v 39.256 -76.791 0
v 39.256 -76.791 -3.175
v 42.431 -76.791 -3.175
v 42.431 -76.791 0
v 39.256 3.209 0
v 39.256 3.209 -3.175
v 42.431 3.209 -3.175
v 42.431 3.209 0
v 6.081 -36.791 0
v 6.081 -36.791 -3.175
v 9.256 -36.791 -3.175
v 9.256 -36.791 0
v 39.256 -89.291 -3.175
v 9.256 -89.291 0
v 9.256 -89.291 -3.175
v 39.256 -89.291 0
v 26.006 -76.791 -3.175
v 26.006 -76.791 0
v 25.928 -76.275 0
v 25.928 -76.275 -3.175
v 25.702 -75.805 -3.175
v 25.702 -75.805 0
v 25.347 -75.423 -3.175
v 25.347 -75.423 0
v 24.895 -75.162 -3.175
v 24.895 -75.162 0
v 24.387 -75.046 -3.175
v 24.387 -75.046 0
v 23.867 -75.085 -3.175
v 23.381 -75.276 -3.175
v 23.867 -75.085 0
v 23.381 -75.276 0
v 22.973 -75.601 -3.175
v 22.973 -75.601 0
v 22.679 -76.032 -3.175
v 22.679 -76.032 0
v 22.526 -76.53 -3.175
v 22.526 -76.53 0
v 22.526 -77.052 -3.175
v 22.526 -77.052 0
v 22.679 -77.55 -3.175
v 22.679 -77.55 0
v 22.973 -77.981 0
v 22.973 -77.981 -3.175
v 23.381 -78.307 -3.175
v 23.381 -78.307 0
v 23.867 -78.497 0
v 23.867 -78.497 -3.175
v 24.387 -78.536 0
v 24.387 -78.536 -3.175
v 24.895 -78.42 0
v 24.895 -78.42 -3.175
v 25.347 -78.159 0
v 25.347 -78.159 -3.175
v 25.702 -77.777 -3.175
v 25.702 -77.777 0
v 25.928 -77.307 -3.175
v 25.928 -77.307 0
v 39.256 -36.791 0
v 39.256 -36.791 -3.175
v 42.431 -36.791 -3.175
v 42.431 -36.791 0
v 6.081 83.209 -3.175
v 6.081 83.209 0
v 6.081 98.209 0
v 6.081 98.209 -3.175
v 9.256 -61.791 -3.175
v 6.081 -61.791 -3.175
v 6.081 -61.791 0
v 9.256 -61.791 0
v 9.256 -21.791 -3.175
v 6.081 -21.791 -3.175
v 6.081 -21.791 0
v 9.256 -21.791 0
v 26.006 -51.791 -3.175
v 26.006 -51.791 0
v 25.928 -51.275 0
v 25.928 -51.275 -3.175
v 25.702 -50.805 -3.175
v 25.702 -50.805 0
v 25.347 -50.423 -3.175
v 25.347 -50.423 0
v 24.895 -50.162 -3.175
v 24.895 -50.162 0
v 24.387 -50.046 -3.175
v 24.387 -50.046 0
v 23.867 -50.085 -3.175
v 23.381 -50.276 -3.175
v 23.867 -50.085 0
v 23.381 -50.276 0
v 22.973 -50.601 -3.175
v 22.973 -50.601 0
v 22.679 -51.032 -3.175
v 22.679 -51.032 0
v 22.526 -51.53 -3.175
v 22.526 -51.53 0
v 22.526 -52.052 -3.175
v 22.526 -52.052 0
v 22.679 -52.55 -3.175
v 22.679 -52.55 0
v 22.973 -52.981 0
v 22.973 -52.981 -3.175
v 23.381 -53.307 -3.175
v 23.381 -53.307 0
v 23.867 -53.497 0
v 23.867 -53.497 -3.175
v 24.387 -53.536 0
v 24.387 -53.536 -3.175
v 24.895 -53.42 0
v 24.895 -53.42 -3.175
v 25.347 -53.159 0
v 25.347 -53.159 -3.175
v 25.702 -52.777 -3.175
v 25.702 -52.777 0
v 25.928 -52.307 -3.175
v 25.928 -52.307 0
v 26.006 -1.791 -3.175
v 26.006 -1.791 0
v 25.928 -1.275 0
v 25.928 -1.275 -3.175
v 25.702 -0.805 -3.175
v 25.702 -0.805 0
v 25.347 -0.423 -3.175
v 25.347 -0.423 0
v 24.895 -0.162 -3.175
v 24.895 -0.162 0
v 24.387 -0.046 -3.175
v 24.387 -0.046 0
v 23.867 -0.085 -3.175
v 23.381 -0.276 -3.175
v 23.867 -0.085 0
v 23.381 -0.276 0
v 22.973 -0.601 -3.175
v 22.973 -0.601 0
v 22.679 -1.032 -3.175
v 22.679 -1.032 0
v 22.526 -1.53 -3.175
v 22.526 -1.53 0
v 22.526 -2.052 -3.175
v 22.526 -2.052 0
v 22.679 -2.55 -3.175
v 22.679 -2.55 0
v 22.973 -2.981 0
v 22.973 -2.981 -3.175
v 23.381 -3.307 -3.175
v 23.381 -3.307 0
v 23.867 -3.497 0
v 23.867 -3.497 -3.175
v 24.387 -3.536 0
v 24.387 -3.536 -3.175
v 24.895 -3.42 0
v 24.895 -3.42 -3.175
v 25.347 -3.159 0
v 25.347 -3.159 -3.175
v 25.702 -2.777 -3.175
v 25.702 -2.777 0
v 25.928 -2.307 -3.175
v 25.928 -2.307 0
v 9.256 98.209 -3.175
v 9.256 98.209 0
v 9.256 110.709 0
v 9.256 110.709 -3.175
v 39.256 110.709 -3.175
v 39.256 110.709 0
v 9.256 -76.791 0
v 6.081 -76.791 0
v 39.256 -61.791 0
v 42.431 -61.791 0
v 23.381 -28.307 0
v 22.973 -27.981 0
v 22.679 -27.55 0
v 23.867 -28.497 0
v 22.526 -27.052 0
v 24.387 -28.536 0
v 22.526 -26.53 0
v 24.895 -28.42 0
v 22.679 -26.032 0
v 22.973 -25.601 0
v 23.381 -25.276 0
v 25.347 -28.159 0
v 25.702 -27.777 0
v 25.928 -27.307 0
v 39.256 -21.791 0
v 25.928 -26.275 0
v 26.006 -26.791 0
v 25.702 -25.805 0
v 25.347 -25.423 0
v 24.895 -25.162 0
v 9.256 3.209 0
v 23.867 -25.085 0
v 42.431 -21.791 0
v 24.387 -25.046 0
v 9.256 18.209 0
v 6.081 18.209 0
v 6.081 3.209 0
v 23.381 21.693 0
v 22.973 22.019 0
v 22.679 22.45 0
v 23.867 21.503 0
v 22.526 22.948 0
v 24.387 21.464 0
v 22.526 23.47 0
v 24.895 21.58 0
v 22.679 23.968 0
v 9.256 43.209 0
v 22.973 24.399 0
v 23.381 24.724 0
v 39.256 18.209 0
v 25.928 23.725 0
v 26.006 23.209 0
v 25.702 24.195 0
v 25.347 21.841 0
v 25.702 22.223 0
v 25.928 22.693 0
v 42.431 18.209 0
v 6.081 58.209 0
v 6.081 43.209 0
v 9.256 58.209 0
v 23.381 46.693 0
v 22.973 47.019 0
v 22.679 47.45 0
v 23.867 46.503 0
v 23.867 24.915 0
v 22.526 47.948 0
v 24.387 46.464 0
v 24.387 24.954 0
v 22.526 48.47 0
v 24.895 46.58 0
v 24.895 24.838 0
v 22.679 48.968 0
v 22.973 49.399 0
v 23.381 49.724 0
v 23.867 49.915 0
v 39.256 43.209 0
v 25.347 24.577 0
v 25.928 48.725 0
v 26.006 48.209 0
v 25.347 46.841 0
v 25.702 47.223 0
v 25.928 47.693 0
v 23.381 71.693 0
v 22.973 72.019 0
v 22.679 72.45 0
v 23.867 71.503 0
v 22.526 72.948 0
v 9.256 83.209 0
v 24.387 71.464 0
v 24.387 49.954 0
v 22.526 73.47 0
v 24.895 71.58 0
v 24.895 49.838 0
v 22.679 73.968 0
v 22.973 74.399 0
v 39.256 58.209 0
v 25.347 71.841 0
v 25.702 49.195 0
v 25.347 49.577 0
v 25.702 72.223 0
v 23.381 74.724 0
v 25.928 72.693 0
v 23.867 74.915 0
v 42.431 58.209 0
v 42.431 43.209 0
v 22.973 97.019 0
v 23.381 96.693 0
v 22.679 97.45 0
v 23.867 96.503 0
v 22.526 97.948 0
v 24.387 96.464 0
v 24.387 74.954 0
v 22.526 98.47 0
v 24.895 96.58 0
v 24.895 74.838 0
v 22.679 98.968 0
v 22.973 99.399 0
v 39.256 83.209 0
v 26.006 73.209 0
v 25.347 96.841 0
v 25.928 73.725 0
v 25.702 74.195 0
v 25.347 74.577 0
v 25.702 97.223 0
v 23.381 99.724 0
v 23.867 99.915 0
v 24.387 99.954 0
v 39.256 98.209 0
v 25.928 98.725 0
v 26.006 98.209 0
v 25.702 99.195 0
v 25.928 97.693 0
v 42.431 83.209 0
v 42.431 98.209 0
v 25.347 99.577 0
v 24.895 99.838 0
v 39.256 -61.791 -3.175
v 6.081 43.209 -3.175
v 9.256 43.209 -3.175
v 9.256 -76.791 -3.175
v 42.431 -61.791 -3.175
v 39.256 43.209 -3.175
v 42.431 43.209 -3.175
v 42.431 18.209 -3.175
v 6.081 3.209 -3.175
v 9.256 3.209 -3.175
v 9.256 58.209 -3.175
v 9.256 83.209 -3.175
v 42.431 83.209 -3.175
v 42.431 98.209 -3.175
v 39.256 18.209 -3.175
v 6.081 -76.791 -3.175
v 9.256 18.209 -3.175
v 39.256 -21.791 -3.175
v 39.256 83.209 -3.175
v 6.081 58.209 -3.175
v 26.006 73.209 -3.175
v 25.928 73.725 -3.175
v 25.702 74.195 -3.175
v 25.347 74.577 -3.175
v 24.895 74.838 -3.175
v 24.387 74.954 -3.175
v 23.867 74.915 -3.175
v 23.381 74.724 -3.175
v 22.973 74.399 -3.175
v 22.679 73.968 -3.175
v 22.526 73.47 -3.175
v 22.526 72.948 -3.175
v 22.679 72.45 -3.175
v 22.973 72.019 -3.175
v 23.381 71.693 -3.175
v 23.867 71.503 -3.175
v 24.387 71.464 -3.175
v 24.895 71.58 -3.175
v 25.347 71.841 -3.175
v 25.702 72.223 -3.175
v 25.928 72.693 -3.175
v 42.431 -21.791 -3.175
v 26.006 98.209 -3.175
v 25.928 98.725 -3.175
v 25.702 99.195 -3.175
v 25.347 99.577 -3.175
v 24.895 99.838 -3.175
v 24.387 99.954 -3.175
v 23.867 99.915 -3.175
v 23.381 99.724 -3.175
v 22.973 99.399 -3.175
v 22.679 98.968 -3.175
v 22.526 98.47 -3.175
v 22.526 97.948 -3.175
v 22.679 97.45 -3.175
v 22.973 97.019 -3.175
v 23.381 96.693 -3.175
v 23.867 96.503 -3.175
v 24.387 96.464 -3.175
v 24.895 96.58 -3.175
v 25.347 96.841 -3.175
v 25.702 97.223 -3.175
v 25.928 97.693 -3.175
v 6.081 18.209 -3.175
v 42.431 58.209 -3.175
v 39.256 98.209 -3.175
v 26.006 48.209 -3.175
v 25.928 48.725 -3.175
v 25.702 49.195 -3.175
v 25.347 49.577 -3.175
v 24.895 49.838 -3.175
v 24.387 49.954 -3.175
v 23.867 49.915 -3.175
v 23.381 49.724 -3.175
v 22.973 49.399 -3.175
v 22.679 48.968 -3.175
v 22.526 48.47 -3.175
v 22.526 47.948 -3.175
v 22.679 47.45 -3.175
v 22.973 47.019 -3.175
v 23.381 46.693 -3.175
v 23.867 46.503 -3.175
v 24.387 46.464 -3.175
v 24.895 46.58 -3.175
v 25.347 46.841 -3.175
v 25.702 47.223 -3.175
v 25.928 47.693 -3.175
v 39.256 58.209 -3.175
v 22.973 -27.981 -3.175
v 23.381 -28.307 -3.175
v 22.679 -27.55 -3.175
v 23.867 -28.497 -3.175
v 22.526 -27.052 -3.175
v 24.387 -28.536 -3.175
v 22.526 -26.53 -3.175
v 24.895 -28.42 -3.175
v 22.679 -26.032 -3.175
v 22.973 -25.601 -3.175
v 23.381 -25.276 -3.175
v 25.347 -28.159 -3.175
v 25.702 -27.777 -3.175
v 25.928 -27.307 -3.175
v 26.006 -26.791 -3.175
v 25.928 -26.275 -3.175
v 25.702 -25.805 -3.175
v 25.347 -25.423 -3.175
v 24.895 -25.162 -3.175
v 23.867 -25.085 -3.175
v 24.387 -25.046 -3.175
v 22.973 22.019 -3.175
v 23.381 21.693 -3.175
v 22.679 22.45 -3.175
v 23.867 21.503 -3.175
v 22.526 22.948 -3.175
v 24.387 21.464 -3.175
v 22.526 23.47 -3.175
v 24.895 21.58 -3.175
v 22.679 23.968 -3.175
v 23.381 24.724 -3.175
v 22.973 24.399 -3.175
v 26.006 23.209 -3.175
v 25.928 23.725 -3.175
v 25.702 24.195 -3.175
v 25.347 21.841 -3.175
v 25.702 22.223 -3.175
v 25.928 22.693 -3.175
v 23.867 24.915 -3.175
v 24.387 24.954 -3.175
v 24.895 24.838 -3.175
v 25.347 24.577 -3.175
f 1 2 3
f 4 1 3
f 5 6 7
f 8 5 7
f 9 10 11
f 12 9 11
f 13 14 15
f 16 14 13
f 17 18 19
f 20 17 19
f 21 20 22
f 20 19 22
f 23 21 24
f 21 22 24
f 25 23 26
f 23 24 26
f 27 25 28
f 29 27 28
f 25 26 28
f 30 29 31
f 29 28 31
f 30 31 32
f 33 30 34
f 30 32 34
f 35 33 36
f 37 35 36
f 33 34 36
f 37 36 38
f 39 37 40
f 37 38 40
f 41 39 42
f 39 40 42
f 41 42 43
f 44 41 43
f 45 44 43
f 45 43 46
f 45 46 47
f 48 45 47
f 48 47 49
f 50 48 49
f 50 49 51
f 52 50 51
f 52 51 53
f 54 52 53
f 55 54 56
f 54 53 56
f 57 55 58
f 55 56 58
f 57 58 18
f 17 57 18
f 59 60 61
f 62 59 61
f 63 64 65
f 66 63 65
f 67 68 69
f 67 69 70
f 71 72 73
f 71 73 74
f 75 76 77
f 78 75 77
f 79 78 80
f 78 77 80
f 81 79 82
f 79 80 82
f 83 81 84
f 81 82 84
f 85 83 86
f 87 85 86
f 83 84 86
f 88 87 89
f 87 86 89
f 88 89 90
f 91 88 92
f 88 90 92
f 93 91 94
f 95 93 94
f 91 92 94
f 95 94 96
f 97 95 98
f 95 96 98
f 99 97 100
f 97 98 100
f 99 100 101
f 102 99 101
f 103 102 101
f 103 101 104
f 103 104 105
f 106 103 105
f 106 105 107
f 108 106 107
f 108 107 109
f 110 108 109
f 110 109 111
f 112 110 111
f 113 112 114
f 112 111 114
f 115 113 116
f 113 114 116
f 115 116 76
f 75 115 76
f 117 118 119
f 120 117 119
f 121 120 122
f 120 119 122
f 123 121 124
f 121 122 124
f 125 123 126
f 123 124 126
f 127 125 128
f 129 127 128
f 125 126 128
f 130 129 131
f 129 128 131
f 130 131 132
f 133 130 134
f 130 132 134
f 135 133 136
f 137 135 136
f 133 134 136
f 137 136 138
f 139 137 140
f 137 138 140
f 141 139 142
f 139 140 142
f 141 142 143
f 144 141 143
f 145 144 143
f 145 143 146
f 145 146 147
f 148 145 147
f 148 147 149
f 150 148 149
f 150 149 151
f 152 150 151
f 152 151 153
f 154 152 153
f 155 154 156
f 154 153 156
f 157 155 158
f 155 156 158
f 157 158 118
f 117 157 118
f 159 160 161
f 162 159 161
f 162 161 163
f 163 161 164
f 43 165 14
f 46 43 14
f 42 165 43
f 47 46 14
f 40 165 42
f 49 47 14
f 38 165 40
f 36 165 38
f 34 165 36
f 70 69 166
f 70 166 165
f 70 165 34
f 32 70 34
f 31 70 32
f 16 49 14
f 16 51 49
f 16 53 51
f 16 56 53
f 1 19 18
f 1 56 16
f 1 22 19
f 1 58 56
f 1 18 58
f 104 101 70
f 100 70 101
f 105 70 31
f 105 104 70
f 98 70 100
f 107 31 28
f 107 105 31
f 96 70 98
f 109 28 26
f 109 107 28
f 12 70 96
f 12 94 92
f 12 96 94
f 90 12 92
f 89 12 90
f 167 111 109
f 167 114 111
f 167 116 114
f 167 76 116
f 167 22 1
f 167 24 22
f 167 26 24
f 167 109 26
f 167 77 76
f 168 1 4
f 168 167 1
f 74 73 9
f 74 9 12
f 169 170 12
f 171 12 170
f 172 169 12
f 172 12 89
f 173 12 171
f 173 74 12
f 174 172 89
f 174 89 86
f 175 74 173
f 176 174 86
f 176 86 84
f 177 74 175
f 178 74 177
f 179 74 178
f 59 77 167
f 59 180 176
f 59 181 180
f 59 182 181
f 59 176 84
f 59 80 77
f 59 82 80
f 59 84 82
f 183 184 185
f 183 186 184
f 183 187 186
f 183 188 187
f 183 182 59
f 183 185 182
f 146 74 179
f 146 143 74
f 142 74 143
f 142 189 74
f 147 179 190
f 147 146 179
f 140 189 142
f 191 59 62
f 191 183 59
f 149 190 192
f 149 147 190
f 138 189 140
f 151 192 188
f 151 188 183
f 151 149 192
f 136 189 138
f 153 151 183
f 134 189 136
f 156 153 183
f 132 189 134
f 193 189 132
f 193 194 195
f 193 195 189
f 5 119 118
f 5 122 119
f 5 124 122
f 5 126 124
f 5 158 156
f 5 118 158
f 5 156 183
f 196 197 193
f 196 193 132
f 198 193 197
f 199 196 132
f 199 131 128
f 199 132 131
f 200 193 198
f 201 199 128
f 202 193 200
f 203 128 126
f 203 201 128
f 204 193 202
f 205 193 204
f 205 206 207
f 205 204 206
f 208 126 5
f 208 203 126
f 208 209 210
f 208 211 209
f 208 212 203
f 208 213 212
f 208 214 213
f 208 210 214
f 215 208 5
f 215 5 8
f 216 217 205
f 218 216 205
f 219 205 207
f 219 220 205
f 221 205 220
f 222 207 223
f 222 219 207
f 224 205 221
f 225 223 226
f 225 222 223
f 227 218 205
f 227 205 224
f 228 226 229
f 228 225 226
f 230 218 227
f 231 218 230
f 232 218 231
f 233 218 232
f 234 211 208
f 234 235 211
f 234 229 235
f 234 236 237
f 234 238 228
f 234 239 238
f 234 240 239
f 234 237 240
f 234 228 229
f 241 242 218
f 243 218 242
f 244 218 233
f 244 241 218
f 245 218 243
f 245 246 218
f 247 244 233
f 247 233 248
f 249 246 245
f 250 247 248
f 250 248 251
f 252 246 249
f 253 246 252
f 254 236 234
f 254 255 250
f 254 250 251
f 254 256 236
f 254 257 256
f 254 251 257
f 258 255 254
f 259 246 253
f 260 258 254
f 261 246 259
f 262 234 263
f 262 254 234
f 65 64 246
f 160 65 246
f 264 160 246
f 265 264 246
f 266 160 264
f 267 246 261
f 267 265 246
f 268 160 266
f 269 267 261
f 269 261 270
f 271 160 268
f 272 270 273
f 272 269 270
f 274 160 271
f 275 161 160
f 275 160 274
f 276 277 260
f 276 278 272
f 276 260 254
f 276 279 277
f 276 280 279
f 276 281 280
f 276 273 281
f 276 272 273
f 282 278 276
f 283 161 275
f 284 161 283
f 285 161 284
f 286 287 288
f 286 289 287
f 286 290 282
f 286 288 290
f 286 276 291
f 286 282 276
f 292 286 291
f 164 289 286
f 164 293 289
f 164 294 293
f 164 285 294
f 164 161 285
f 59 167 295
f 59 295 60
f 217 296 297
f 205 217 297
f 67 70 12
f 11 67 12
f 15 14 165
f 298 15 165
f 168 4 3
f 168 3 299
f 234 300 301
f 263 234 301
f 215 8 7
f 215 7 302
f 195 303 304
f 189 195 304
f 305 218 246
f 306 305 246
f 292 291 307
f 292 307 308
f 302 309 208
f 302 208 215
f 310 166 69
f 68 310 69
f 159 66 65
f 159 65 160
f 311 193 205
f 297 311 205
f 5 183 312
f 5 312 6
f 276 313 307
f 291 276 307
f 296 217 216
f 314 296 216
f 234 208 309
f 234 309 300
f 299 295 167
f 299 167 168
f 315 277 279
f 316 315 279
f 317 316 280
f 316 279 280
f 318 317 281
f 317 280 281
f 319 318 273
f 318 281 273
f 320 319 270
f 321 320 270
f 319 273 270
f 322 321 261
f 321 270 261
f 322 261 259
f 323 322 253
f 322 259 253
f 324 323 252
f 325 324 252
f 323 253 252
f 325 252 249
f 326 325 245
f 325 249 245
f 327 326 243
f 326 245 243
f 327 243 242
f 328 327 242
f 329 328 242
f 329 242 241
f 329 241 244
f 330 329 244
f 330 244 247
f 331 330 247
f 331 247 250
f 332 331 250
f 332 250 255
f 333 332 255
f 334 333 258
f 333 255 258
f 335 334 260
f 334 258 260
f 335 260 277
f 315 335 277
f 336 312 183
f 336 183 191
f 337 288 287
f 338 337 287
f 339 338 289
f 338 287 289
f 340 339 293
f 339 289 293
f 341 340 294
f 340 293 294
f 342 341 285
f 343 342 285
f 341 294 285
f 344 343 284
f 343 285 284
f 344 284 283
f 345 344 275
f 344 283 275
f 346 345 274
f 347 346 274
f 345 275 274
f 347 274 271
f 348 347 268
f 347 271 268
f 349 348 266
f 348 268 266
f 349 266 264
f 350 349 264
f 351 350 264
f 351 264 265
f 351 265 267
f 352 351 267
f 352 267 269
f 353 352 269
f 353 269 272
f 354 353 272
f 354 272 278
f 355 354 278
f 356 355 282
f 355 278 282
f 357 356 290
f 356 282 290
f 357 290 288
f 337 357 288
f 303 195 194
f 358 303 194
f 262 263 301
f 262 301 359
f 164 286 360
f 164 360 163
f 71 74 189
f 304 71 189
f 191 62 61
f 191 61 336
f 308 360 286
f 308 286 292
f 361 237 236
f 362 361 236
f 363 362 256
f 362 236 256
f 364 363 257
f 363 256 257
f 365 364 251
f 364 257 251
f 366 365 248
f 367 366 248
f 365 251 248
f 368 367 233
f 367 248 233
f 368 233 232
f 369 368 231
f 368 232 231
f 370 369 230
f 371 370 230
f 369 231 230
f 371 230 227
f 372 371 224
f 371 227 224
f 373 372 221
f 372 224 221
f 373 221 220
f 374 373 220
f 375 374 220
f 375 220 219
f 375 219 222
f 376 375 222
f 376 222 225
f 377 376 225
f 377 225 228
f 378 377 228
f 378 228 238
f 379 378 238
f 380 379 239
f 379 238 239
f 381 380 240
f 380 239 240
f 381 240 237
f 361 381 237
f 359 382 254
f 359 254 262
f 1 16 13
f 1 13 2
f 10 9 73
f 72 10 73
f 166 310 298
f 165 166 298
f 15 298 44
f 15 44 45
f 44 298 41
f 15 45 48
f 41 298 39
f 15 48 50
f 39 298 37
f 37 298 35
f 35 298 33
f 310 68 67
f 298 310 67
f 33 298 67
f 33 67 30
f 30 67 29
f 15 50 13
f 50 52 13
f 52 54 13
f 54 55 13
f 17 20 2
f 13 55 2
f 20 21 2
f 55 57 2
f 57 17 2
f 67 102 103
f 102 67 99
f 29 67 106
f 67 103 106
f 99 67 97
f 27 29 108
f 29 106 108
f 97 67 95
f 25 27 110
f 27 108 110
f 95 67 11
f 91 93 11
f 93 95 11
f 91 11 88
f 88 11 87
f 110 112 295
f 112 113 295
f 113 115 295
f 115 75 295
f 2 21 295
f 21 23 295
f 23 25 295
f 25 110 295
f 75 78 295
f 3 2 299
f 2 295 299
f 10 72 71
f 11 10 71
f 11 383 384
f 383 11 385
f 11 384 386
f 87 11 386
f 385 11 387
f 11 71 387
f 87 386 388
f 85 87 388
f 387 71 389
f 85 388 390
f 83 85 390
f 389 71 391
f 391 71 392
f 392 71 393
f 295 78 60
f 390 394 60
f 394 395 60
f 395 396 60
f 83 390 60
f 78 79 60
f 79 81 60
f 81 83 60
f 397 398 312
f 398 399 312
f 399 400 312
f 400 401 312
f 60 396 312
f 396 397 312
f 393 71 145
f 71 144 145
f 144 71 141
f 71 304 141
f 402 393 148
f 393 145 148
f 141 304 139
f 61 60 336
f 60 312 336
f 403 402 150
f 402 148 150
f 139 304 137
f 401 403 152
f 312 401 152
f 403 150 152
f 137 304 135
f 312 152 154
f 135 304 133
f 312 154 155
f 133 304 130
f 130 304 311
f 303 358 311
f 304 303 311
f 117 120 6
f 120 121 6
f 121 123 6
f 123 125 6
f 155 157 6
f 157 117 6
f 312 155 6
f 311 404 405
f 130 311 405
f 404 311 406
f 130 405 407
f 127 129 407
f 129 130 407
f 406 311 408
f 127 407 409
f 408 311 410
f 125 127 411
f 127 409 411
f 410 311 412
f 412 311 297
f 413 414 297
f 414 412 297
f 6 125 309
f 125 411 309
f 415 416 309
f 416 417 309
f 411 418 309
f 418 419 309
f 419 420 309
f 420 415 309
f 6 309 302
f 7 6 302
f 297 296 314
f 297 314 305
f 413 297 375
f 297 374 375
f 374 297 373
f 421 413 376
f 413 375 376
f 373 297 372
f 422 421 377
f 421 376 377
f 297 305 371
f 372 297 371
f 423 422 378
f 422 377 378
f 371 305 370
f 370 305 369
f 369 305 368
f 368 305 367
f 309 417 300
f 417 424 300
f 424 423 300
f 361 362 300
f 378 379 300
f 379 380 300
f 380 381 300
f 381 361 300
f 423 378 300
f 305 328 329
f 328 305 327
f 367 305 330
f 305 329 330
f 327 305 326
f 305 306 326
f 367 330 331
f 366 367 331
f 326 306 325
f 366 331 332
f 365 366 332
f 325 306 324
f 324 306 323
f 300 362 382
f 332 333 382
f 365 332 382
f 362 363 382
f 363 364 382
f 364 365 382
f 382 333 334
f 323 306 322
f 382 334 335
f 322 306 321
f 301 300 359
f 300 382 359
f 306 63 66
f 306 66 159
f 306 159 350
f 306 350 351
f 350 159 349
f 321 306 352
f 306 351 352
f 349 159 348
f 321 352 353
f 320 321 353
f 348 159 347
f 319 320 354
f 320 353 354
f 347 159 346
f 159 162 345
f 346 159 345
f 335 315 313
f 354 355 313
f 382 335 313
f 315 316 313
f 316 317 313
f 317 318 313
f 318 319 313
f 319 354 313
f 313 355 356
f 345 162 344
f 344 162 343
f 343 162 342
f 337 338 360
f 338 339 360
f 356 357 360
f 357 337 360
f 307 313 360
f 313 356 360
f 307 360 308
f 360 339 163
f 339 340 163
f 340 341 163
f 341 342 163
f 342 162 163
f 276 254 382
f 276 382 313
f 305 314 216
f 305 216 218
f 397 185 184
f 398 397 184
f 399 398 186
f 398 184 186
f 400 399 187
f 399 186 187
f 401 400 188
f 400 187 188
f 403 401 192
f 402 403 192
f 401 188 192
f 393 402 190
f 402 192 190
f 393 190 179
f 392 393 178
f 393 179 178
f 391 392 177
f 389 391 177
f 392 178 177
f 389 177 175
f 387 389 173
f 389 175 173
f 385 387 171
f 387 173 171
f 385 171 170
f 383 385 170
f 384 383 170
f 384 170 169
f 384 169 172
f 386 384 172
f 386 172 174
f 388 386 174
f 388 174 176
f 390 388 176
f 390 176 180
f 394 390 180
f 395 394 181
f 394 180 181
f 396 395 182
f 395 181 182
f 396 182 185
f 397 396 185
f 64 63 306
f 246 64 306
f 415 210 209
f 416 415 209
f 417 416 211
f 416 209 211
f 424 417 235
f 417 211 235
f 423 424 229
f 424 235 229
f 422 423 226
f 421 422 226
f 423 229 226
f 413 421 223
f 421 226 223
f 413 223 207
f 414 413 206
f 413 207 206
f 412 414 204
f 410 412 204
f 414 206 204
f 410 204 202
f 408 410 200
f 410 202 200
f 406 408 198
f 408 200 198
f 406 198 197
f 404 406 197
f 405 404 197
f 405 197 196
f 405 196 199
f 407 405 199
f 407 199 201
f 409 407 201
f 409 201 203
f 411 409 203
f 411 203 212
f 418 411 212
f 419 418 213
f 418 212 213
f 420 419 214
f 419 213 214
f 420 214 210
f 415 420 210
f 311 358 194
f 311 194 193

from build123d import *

# Parameters (mm, degrees)
SKETCH1_W          = 36.35
SKETCH1_H          = 200
SKETCH1_R          = 1.75
BASE_FLANGE1_DEPTH = 3.175
SKETCH2_W          = 3.175
SKETCH2_H          = 25
CUT_EXTRUDE1_DEPTH = 10
LPATTERN1_COUNT    = 6
LPATTERN1_PITCH    = 40


# Sheet-metal steps are written as plain solids
with BuildPart() as part:
    # Sketch1 → Base-Flange1 (new body)
    with BuildSketch(Plane.XY):
        with Locations((24.256146731, 10.708830738)):
            Rectangle(SKETCH1_W, SKETCH1_H)
        with Locations((24.256146731, 98.208830738)):
            Circle(SKETCH1_R, mode=Mode.SUBTRACT)
        with Locations((24.256146731, 73.208830738)):
            Circle(SKETCH1_R, mode=Mode.SUBTRACT)
        with Locations((24.256146731, 48.208830738)):
            Circle(SKETCH1_R, mode=Mode.SUBTRACT)
        with Locations((24.256146731, 23.208830738)):
            Circle(SKETCH1_R, mode=Mode.SUBTRACT)
        with Locations((24.256146731, -1.791169262)):
            Circle(SKETCH1_R, mode=Mode.SUBTRACT)
        with Locations((24.256146731, -26.791169262)):
            Circle(SKETCH1_R, mode=Mode.SUBTRACT)
        with Locations((24.256146731, -51.791169262)):
            Circle(SKETCH1_R, mode=Mode.SUBTRACT)
        with Locations((24.256146731, -76.791169262)):
            Circle(SKETCH1_R, mode=Mode.SUBTRACT)
    extrude(amount=-BASE_FLANGE1_DEPTH)

    # Sketch2 → Cut-Extrude1 (cut)
    with BuildSketch(Plane.XY):
        with Locations((7.668646731, -89.291169262)):
            Rectangle(SKETCH2_W, SKETCH2_H)
        with Locations((40.843646731, -89.291169262)):
            Rectangle(SKETCH2_W, SKETCH2_H)
    cut_extrude1 = extrude(amount=-CUT_EXTRUDE1_DEPTH, mode=Mode.SUBTRACT)

    # LPattern1: Cut-Extrude1 ×6
    with Locations(*[(0, i * LPATTERN1_PITCH, 0) for i in range(1, LPATTERN1_COUNT)]):
        add(cut_extrude1, mode=Mode.SUBTRACT)


solid = part.part
